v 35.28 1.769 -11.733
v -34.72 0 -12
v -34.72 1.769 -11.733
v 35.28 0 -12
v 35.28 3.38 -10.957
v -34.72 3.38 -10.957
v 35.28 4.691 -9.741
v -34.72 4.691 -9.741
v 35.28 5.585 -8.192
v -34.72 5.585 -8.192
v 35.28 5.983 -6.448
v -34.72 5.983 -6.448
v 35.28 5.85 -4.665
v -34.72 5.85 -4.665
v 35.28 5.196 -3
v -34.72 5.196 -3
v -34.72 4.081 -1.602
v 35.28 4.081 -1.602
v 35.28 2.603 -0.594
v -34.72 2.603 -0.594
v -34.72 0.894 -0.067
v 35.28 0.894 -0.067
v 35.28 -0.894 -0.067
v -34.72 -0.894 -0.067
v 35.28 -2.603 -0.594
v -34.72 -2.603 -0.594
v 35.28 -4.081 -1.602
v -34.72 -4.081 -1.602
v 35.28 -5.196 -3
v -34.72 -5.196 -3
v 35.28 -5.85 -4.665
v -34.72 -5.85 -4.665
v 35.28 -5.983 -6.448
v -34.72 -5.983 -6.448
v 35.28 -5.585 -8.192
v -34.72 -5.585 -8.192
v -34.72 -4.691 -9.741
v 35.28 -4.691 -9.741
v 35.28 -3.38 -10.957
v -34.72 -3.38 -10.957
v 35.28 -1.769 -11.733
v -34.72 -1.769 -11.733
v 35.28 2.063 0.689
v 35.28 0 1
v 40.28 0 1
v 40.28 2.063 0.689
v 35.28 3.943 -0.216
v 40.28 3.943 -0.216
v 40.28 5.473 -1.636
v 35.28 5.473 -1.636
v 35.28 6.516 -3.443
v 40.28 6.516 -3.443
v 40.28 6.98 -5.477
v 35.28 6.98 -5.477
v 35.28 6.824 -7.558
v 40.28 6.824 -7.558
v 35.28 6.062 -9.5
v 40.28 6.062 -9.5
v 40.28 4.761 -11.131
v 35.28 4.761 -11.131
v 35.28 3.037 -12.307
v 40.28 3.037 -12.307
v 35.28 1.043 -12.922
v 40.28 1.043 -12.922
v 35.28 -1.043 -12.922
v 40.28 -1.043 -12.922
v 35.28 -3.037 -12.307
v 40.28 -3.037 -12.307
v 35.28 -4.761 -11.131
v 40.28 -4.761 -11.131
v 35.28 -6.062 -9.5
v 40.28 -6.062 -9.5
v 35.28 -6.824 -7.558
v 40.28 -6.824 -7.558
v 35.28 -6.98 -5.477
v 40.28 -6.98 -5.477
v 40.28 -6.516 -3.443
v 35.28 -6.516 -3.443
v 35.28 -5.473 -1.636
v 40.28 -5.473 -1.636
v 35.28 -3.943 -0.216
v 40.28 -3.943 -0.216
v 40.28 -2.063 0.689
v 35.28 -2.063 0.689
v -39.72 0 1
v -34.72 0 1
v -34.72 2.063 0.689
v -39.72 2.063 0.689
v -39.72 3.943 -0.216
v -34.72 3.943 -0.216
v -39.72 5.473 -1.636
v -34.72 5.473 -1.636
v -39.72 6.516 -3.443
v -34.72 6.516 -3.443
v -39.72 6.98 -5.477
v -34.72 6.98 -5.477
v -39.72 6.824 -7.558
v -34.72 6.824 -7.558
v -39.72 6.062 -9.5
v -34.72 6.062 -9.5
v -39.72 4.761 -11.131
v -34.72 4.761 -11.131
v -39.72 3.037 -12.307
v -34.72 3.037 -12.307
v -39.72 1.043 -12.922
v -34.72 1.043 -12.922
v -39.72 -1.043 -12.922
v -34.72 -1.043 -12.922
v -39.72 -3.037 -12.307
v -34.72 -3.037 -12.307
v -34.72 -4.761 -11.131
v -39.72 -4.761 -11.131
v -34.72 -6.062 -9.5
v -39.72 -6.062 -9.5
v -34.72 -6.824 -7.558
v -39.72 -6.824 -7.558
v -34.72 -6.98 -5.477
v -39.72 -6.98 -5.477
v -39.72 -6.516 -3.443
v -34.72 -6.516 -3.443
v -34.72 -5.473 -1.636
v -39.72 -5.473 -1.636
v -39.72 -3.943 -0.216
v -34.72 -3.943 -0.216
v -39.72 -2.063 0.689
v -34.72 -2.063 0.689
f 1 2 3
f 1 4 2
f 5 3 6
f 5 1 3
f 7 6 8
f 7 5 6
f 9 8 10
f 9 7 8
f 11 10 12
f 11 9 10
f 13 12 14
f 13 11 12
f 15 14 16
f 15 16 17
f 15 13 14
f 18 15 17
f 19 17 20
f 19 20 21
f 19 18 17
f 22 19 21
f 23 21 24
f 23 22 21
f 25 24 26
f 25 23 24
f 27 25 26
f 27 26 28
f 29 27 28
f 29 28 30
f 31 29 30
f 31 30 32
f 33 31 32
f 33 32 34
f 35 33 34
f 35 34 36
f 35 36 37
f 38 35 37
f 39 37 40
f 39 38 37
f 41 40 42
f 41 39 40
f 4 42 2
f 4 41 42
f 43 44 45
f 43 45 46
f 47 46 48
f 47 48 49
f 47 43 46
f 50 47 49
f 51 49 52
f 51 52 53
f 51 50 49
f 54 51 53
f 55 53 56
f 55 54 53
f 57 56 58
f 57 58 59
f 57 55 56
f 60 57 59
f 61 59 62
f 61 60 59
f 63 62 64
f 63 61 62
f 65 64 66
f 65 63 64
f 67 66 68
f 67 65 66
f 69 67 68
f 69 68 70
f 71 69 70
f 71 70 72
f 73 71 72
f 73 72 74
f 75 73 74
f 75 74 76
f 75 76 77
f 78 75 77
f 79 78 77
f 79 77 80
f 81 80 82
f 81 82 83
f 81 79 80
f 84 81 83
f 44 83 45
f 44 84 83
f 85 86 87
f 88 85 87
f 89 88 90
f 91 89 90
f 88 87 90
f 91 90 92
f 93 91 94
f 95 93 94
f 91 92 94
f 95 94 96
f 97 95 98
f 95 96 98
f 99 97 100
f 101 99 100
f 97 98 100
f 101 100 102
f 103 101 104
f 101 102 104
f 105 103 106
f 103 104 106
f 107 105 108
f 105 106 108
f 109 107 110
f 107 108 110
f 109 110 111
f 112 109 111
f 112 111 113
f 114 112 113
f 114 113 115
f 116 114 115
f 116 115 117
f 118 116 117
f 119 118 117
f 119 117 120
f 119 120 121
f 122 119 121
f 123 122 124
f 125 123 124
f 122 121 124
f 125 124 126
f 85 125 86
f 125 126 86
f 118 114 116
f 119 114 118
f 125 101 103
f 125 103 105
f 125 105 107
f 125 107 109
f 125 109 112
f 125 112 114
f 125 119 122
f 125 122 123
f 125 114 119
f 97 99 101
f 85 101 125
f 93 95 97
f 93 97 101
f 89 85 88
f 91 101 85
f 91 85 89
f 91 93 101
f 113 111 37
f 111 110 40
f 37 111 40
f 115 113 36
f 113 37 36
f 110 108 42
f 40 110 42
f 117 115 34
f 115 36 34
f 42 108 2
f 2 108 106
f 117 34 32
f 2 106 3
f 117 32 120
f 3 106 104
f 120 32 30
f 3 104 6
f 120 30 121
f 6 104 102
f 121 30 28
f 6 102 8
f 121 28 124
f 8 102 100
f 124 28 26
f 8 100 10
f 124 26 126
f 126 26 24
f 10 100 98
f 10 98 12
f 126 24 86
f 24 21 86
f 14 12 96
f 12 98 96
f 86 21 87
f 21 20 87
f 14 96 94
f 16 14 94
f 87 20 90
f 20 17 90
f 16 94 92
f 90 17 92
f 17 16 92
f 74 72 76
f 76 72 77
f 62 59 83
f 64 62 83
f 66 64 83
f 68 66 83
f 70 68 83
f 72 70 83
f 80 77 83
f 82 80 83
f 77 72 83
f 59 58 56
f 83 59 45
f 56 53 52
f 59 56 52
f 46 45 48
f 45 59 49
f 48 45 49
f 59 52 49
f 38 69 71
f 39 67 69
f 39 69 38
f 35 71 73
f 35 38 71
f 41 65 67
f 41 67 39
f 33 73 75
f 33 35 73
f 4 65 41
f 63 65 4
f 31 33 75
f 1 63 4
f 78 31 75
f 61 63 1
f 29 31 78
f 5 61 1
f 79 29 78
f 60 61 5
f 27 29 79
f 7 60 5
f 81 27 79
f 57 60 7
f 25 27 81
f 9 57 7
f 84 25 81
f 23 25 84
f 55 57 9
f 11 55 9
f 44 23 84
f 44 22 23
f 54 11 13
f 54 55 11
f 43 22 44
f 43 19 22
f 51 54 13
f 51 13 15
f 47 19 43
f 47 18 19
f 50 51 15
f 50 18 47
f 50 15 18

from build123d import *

# Parameters (mm, degrees)
SKETCH1_W           = 70
SKETCH1_H           = 6
SKETCH2_R           = 7
BOSS_EXTRUDE1_DEPTH = 5


with BuildPart() as part:
    # Sketch1 → Revolve1 (revolve)
    with BuildSketch(Plane(origin=(0, 0, 0), x_dir=(1, 0, 0), z_dir=(0, 1, 0))):
        with Locations((0.279538905, 9)):
            Rectangle(SKETCH1_W, SKETCH1_H)
    revolve(axis=Axis((-34.720461095, 0, -6), (1, 0, 0)))

    # Sketch2 → Boss-Extrude1 (add)
    with BuildSketch(Plane.ZY.offset(34.720461095)):
        with Locations((-6, 0)):
            Circle(SKETCH2_R)
    boss_extrude1 = extrude(amount=BOSS_EXTRUDE1_DEPTH)

    # Mirror1: Boss-Extrude1 across plane
    add(boss_extrude1.mirror(Plane(origin=(0.279538905, 0, 0), x_dir=(0, 0, 1), z_dir=(1, 0, 0))))


solid = part.part
